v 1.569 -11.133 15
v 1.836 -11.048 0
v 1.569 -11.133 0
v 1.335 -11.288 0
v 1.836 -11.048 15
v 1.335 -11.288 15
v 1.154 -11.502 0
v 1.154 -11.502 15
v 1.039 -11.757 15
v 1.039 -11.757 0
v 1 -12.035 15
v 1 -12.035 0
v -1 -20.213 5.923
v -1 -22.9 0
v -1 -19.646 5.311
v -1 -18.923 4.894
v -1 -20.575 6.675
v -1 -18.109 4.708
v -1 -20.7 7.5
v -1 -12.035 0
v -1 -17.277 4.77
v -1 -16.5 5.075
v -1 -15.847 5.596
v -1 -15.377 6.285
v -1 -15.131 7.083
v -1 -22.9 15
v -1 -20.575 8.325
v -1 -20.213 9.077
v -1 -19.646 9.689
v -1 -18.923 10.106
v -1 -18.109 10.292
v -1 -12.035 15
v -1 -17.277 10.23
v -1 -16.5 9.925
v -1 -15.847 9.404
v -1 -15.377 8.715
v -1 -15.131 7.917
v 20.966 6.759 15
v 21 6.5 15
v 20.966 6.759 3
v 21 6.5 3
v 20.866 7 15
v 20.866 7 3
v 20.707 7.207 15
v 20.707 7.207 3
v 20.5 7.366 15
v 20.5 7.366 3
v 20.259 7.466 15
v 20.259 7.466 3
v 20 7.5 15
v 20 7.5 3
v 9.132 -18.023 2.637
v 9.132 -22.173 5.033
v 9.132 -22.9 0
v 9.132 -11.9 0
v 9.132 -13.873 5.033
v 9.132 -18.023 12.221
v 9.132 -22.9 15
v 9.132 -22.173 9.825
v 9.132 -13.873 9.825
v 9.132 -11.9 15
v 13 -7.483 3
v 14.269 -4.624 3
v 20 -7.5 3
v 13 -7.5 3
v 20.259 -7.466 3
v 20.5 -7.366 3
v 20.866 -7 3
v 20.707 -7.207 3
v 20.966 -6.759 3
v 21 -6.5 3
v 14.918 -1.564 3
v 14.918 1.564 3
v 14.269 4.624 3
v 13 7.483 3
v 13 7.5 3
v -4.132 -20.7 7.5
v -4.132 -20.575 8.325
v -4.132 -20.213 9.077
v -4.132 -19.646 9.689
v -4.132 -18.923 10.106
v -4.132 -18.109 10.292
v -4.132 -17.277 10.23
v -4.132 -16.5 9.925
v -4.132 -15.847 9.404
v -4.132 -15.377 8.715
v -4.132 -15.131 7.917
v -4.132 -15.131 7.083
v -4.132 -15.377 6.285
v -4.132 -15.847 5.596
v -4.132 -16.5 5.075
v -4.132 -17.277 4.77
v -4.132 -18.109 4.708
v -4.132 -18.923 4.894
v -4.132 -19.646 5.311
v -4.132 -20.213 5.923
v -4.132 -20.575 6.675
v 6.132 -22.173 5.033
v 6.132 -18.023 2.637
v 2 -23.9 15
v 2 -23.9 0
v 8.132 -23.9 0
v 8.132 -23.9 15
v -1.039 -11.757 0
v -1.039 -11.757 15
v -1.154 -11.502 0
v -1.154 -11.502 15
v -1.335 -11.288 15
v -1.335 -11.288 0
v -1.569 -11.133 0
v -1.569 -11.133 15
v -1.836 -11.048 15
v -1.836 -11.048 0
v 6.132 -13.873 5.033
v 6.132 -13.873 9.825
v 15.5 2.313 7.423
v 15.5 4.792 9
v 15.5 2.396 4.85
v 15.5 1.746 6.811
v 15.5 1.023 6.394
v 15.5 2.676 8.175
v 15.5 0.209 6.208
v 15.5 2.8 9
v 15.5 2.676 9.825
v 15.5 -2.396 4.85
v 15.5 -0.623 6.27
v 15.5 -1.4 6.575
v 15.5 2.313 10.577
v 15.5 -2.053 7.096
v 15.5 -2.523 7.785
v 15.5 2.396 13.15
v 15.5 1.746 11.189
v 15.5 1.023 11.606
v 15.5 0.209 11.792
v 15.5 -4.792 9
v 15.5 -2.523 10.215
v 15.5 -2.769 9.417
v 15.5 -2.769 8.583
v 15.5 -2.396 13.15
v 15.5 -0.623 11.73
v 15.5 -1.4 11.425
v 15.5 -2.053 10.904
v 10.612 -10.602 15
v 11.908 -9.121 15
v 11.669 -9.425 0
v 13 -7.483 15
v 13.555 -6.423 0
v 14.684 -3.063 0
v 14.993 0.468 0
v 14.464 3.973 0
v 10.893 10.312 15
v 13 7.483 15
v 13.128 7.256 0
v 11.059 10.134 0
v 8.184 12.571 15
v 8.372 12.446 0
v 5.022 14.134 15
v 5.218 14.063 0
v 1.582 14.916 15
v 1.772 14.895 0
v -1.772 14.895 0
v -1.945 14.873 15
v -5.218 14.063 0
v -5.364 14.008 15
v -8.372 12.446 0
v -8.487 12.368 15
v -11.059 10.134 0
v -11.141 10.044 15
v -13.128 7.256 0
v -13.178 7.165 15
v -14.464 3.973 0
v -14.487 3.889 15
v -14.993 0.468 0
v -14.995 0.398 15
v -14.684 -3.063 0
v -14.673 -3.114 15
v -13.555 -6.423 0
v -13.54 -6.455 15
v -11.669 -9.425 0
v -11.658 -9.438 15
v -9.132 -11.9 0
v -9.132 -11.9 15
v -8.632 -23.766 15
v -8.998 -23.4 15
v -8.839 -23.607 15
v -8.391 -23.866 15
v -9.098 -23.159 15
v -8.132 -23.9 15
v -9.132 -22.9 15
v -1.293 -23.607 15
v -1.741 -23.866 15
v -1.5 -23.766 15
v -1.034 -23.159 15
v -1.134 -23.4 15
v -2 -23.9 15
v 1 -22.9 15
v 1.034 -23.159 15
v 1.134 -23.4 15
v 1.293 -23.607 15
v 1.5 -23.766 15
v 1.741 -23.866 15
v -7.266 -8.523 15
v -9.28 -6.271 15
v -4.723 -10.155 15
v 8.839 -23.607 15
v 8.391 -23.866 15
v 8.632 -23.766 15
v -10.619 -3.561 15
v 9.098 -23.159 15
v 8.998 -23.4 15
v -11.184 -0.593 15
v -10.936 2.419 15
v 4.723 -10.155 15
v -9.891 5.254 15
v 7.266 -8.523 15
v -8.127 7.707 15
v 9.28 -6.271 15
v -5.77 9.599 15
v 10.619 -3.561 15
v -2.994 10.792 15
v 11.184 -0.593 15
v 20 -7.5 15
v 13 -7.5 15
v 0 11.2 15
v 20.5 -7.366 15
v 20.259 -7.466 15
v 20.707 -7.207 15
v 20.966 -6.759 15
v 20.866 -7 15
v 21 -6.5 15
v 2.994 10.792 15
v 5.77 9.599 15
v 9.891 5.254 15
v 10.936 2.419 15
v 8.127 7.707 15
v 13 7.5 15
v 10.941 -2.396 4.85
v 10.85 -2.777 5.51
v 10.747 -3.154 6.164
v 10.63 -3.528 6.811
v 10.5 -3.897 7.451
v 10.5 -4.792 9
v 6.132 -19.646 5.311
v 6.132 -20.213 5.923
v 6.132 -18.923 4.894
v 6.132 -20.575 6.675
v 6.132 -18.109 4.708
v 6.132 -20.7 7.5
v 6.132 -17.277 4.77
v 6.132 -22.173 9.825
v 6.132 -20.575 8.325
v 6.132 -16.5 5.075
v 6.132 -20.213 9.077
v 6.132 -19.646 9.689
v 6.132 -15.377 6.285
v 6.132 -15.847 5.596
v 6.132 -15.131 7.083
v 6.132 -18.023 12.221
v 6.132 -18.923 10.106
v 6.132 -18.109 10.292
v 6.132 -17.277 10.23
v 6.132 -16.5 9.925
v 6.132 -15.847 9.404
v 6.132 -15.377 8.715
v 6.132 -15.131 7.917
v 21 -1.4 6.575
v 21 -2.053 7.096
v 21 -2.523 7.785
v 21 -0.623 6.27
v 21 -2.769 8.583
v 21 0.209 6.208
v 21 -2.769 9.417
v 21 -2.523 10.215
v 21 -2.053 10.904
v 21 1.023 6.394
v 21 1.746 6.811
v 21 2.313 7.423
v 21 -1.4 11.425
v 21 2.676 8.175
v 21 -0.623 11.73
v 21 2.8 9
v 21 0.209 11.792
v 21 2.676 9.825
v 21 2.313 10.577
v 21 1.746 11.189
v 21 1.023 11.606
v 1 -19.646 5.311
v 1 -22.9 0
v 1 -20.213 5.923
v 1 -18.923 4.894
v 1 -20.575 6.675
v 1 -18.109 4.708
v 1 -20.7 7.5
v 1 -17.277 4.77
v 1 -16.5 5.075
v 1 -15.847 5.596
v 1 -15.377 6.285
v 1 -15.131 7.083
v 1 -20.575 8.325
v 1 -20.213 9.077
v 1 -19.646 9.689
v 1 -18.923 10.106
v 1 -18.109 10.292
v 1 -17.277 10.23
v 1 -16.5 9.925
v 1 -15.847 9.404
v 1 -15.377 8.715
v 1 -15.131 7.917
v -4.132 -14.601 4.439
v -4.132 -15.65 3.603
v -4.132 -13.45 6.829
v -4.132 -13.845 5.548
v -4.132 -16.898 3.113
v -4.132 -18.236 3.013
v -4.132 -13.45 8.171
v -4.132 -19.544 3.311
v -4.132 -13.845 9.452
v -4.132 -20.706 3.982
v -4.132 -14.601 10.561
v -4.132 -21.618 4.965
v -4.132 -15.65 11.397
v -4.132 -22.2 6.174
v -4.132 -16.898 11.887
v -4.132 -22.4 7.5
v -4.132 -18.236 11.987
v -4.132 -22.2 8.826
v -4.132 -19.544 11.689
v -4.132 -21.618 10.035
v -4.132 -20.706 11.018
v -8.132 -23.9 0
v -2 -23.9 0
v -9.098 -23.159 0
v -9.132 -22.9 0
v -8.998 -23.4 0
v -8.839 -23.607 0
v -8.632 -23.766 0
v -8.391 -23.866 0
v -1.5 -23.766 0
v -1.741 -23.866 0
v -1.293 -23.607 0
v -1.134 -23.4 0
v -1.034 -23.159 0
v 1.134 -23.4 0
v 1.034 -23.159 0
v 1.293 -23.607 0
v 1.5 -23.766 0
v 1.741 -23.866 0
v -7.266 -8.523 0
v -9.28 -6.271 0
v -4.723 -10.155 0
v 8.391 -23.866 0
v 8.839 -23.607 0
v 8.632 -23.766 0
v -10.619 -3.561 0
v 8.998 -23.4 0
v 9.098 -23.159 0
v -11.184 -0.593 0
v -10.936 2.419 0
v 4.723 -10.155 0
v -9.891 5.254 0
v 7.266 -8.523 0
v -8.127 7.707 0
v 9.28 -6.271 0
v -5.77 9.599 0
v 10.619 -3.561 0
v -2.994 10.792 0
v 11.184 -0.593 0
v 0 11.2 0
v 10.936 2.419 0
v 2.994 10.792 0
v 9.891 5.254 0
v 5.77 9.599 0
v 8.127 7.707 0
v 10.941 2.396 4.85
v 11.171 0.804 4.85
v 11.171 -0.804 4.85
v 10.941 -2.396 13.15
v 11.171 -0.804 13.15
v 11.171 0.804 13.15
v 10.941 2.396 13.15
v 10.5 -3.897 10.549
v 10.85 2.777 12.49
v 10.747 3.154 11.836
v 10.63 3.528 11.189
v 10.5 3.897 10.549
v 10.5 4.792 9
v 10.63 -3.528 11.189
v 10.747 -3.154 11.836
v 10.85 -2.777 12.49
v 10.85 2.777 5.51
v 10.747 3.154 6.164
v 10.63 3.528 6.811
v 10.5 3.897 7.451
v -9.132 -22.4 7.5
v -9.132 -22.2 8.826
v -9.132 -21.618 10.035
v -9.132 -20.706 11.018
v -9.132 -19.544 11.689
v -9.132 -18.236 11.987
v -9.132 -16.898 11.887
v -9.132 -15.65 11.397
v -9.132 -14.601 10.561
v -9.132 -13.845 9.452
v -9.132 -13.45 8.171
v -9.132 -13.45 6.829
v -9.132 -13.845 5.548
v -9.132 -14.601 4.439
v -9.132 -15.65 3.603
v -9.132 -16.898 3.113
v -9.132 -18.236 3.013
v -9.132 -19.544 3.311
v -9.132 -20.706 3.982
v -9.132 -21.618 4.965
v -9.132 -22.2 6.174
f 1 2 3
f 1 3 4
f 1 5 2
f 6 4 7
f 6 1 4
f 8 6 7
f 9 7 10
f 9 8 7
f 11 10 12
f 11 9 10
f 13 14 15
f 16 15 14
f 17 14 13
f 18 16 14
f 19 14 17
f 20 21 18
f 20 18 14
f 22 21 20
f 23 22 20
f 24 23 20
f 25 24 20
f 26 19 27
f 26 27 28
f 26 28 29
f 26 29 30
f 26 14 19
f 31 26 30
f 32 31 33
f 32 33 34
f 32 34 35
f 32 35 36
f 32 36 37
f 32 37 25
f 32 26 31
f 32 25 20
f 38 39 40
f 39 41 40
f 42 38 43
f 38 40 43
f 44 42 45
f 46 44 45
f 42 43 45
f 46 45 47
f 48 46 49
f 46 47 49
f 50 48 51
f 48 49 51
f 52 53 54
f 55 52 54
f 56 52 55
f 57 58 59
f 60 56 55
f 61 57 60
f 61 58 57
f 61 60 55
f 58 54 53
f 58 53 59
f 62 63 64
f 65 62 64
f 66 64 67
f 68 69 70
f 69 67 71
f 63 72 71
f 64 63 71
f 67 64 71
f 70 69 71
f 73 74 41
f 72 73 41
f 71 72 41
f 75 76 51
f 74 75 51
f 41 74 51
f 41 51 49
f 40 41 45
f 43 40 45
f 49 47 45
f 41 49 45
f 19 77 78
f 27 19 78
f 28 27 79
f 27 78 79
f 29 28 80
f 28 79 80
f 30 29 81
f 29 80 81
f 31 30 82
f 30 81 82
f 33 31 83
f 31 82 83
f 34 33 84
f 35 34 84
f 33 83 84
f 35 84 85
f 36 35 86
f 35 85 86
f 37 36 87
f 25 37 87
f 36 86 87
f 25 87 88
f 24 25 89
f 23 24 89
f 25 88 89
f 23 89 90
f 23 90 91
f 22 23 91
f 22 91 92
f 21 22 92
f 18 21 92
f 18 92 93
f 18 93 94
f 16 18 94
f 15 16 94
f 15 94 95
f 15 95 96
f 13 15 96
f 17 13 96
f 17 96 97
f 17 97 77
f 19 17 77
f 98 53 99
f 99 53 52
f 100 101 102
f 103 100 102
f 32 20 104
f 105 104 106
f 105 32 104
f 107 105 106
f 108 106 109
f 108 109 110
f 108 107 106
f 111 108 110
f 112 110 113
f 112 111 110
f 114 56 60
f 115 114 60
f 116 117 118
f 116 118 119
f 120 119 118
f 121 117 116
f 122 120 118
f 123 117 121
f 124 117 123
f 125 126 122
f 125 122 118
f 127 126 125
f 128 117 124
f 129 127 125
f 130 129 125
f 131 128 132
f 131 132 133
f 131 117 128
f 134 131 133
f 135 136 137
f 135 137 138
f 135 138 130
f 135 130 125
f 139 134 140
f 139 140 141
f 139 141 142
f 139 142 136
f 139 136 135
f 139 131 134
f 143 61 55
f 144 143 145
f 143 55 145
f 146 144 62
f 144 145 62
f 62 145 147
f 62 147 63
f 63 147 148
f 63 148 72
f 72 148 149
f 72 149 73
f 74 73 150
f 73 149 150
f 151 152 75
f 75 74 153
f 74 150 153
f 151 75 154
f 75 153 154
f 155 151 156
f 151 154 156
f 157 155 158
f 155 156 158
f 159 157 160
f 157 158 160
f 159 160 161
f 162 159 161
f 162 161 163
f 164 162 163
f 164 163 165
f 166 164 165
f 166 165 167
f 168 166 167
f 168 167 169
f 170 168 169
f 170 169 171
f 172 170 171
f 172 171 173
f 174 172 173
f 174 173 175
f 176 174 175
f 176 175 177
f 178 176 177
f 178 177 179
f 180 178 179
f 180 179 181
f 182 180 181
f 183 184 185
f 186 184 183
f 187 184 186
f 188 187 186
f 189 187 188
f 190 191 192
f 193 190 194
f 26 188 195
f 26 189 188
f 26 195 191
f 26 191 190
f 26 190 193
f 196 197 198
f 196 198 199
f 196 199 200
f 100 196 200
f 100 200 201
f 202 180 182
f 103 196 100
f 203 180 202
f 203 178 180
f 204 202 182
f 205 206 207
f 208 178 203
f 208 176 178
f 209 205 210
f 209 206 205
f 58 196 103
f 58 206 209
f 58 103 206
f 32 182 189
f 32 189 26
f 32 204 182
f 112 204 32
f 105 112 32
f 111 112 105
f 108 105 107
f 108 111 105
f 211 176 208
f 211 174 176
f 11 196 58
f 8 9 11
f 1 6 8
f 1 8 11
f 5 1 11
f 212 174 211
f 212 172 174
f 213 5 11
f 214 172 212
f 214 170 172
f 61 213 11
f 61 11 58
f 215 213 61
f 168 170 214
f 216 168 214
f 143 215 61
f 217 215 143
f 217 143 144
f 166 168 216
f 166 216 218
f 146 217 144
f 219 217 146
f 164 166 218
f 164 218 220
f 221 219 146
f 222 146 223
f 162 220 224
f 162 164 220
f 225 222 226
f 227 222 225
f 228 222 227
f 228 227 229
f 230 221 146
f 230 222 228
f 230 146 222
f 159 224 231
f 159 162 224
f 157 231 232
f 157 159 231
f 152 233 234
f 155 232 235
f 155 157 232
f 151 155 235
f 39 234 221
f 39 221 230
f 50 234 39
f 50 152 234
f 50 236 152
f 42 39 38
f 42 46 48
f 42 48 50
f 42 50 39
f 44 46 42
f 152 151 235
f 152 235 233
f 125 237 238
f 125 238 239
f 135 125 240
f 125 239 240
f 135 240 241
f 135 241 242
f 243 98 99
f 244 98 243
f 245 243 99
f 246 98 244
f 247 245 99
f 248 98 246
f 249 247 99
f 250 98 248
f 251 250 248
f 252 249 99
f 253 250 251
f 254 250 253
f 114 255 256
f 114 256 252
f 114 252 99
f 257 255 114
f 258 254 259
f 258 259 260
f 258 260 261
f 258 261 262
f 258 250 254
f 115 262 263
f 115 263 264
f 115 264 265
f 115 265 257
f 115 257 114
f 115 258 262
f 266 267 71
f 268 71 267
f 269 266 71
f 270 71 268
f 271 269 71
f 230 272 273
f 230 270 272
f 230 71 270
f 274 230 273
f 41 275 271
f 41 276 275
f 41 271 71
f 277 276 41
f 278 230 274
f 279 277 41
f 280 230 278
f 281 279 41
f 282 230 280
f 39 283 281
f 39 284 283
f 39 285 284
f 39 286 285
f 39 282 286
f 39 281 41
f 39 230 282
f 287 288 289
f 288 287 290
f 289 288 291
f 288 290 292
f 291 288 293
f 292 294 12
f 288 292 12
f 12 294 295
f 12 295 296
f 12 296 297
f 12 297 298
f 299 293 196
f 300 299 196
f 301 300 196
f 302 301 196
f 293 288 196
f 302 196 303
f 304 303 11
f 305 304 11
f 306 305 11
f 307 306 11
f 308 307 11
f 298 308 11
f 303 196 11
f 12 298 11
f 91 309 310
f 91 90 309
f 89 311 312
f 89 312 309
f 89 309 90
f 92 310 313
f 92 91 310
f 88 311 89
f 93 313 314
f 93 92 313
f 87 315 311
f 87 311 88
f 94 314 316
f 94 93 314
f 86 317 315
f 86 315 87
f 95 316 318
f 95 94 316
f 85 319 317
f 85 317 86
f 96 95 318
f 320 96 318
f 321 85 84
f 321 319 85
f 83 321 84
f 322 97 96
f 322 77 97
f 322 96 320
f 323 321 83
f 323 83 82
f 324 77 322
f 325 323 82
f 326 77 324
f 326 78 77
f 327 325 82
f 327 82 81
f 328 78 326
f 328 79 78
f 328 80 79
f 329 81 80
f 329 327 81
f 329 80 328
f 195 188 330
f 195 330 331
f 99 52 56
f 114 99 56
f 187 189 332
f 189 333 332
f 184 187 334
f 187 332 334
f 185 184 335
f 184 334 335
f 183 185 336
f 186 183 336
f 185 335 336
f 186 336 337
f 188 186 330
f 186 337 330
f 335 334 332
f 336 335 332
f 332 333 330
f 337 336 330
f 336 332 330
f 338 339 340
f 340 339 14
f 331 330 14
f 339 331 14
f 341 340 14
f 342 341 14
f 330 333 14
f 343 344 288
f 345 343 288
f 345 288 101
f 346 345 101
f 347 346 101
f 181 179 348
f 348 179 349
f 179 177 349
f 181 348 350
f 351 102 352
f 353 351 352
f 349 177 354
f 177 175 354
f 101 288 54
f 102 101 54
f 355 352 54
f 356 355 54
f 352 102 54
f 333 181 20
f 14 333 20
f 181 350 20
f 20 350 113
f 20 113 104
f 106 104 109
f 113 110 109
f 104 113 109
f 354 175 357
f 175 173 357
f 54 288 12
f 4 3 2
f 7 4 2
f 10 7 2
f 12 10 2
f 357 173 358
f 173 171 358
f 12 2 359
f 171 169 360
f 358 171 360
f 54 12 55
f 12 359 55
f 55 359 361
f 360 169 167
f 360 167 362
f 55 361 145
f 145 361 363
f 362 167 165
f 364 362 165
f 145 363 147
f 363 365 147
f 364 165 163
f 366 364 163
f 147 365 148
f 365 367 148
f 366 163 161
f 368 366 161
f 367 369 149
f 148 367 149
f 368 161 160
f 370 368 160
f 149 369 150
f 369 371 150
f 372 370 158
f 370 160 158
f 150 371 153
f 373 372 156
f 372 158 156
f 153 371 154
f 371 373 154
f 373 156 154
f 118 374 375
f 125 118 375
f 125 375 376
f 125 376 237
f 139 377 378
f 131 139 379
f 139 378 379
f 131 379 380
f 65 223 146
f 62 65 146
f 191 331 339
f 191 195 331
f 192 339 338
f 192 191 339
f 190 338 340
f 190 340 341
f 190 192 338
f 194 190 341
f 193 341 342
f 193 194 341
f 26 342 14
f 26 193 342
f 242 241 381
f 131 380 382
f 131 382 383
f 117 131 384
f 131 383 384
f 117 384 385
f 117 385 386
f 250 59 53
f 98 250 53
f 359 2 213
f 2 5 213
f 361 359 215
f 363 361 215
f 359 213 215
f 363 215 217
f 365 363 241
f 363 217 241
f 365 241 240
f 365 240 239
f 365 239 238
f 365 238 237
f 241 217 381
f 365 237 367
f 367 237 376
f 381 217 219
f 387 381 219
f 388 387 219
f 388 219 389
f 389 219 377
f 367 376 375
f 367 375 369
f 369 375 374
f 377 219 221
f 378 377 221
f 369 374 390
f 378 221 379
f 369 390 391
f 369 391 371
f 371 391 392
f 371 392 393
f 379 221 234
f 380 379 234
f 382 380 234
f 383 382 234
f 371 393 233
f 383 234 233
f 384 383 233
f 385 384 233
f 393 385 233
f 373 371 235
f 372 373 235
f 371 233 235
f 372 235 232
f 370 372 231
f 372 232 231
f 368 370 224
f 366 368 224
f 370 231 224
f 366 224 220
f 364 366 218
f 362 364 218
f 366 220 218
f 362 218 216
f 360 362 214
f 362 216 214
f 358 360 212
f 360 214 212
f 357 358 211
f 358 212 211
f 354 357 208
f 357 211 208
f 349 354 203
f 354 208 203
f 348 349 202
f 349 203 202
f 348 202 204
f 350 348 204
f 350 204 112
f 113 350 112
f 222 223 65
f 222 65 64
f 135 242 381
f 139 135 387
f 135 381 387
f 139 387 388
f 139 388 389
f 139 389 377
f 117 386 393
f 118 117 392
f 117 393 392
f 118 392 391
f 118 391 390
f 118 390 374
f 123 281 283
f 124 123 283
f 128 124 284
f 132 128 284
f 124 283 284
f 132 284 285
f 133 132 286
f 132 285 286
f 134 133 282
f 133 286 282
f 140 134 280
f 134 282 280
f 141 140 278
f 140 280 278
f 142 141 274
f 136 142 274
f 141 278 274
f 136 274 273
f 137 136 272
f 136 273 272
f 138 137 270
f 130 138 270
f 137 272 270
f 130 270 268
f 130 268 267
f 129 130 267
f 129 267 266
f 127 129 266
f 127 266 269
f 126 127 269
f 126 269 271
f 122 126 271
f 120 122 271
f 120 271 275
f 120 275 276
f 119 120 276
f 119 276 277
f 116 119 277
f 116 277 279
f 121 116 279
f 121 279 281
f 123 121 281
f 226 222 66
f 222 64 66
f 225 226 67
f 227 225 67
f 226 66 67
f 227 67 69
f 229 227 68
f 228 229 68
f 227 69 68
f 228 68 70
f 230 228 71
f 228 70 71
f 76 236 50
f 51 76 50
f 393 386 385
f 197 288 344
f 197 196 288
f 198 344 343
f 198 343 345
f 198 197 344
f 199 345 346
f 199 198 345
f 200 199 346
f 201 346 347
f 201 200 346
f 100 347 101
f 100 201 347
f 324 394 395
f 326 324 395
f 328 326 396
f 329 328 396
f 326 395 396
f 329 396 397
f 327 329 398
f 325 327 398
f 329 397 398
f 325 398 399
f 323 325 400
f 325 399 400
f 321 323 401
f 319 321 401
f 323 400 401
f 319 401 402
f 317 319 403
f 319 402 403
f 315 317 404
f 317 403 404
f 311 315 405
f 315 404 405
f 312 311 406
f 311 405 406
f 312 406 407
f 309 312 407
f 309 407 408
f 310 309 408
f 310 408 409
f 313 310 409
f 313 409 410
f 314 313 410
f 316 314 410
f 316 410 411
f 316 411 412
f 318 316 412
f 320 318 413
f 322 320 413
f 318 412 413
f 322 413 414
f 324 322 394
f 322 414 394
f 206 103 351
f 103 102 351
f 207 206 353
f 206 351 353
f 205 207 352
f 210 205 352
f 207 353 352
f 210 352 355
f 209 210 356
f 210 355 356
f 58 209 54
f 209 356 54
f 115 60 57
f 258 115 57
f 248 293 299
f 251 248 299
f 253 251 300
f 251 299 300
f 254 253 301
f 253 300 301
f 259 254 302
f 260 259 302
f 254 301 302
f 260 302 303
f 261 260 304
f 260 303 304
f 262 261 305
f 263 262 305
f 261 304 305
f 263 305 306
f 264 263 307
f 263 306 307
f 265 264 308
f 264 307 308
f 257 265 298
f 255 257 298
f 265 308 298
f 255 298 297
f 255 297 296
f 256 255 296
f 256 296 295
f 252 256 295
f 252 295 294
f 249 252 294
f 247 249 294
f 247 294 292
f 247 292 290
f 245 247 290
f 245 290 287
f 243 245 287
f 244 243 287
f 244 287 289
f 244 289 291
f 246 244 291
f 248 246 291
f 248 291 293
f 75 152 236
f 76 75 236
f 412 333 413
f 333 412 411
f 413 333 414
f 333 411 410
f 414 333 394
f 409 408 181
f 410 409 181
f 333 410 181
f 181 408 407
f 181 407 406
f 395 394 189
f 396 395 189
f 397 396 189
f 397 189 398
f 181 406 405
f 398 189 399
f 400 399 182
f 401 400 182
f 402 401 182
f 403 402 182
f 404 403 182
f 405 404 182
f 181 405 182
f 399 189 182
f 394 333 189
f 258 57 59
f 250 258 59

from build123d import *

# Parameters (mm, degrees)
SKETCH_R        = 15
PAD_DEPTH       = 15
SKETCH001_R     = 11.2
POCKET_DEPTH    = 15.001
SKETCH002_W     = 8
SKETCH002_H     = 15
PAD001_DEPTH    = 12
SKETCH003_W     = 18.264062
SKETCH003_H     = 12
PAD002_DEPTH    = 15
SKETCH004_R     = 2.8
POCKET001_DEPTH = 30.133031
POCKET002_DEPTH = 3
SKETCH006_R     = 4.5
POCKET003_DEPTH = 5
SKETCH007_W     = 2
SKETCH007_H     = 28.949347
POCKET004_DEPTH = 15.001
POCKET005_DEPTH = 2.5
SKETCH008_R     = 2.8
POCKET006_DEPTH = 14
FILLET_R        = 1
FILLET001_R     = 1


with BuildPart() as part:
    # Sketch → Pad (new body)
    with BuildSketch(Plane.XY):
        Circle(SKETCH_R)
    extrude(amount=PAD_DEPTH)

    # Sketch001 → Pocket (cut, through all)
    with BuildSketch(Plane.XY.offset(15)):
        Circle(SKETCH001_R)
    extrude(amount=-POCKET_DEPTH, mode=Mode.SUBTRACT)

    # Sketch002 → Pad001 (new body)
    with BuildSketch(Plane.XY.offset(15)):
        with Locations((17, 0)):
            Rectangle(SKETCH002_W, SKETCH002_H)
    extrude(amount=-PAD001_DEPTH)

    # Sketch003 → Pad002 (new body)
    with BuildSketch(Plane.XY.offset(15)):
        with Locations((0, -17.899832)):
            Rectangle(SKETCH003_W, SKETCH003_H)
    extrude(amount=-PAD002_DEPTH)

    # Sketch004 → Pocket001 (cut, through all)
    with BuildSketch(Plane(origin=(-9.132031, 0, 0), x_dir=(0, -1, 0), z_dir=(-1, 0, 0))):
        with Locations((17.899832, 7.5)):
            Circle(SKETCH004_R)
    extrude(amount=-POCKET001_DEPTH, mode=Mode.SUBTRACT)

    # Sketch005 → Pocket002 (cut)
    with BuildSketch(Plane.YZ.offset(9.132031)):
        Polygon((-18.023397, 2.63711), (-13.873397, 5.033113), (-13.873397, 9.825121), (-18.023397, 12.221124), (-22.173397, 9.825121), (-22.173397, 5.033113), align=None)
    extrude(amount=-POCKET002_DEPTH, mode=Mode.SUBTRACT)

    # Sketch006 → Pocket003 (cut)
    with BuildSketch(Plane(origin=(-9.132031, 0, 0), x_dir=(0, -1, 0), z_dir=(-1, 0, 0))):
        with Locations((17.899832, 7.5)):
            Circle(SKETCH006_R)
    extrude(amount=-POCKET003_DEPTH, mode=Mode.SUBTRACT)

    # Sketch007 → Pocket004 (cut, through all)
    with BuildSketch(Plane.XY.offset(15)):
        with Locations((0, -19.659897)):
            Rectangle(SKETCH007_W, SKETCH007_H)
    extrude(amount=-POCKET004_DEPTH, mode=Mode.SUBTRACT)

    # Sketch009 → Pocket005 (cut, symmetric)
    with BuildSketch(Plane(origin=(13, 0, 0), x_dir=(0, -1, 0), z_dir=(-1, 0, 0))):
        Polygon((2.396004, 4.85), (4.792007, 9), (2.396004, 13.15), (-2.396004, 13.15), (-4.792007, 9), (-2.396004, 4.85), align=None)
    extrude(amount=POCKET005_DEPTH, both=True, mode=Mode.SUBTRACT)

    # Sketch008 → Pocket006 (cut)
    with BuildSketch(Plane.YZ.offset(21)):
        with Locations((0, 9)):
            Circle(SKETCH008_R)
    extrude(amount=-POCKET006_DEPTH, mode=Mode.SUBTRACT)

    # Fillet
    fillet_edges = [part.edges().sort_by_distance(p)[0] for p in [
        (21, 7.5, 9),
        (21, -7.5, 9),
        (9.132031, -23.899832, 7.5),
        (1, -23.899832, 7.5),
        (-1, -23.899832, 7.5),
        (-9.132031, -23.899832, 7.5),
    ]]
    fillet(fillet_edges, radius=FILLET_R)

    # Fillet001
    fillet001_edges = [part.edges().sort_by_distance(p)[0] for p in [
        (1, -11.155268, 7.5),
        (-1, -11.155268, 7.5),
    ]]
    fillet(fillet001_edges, radius=FILLET001_R)


solid = part.part
